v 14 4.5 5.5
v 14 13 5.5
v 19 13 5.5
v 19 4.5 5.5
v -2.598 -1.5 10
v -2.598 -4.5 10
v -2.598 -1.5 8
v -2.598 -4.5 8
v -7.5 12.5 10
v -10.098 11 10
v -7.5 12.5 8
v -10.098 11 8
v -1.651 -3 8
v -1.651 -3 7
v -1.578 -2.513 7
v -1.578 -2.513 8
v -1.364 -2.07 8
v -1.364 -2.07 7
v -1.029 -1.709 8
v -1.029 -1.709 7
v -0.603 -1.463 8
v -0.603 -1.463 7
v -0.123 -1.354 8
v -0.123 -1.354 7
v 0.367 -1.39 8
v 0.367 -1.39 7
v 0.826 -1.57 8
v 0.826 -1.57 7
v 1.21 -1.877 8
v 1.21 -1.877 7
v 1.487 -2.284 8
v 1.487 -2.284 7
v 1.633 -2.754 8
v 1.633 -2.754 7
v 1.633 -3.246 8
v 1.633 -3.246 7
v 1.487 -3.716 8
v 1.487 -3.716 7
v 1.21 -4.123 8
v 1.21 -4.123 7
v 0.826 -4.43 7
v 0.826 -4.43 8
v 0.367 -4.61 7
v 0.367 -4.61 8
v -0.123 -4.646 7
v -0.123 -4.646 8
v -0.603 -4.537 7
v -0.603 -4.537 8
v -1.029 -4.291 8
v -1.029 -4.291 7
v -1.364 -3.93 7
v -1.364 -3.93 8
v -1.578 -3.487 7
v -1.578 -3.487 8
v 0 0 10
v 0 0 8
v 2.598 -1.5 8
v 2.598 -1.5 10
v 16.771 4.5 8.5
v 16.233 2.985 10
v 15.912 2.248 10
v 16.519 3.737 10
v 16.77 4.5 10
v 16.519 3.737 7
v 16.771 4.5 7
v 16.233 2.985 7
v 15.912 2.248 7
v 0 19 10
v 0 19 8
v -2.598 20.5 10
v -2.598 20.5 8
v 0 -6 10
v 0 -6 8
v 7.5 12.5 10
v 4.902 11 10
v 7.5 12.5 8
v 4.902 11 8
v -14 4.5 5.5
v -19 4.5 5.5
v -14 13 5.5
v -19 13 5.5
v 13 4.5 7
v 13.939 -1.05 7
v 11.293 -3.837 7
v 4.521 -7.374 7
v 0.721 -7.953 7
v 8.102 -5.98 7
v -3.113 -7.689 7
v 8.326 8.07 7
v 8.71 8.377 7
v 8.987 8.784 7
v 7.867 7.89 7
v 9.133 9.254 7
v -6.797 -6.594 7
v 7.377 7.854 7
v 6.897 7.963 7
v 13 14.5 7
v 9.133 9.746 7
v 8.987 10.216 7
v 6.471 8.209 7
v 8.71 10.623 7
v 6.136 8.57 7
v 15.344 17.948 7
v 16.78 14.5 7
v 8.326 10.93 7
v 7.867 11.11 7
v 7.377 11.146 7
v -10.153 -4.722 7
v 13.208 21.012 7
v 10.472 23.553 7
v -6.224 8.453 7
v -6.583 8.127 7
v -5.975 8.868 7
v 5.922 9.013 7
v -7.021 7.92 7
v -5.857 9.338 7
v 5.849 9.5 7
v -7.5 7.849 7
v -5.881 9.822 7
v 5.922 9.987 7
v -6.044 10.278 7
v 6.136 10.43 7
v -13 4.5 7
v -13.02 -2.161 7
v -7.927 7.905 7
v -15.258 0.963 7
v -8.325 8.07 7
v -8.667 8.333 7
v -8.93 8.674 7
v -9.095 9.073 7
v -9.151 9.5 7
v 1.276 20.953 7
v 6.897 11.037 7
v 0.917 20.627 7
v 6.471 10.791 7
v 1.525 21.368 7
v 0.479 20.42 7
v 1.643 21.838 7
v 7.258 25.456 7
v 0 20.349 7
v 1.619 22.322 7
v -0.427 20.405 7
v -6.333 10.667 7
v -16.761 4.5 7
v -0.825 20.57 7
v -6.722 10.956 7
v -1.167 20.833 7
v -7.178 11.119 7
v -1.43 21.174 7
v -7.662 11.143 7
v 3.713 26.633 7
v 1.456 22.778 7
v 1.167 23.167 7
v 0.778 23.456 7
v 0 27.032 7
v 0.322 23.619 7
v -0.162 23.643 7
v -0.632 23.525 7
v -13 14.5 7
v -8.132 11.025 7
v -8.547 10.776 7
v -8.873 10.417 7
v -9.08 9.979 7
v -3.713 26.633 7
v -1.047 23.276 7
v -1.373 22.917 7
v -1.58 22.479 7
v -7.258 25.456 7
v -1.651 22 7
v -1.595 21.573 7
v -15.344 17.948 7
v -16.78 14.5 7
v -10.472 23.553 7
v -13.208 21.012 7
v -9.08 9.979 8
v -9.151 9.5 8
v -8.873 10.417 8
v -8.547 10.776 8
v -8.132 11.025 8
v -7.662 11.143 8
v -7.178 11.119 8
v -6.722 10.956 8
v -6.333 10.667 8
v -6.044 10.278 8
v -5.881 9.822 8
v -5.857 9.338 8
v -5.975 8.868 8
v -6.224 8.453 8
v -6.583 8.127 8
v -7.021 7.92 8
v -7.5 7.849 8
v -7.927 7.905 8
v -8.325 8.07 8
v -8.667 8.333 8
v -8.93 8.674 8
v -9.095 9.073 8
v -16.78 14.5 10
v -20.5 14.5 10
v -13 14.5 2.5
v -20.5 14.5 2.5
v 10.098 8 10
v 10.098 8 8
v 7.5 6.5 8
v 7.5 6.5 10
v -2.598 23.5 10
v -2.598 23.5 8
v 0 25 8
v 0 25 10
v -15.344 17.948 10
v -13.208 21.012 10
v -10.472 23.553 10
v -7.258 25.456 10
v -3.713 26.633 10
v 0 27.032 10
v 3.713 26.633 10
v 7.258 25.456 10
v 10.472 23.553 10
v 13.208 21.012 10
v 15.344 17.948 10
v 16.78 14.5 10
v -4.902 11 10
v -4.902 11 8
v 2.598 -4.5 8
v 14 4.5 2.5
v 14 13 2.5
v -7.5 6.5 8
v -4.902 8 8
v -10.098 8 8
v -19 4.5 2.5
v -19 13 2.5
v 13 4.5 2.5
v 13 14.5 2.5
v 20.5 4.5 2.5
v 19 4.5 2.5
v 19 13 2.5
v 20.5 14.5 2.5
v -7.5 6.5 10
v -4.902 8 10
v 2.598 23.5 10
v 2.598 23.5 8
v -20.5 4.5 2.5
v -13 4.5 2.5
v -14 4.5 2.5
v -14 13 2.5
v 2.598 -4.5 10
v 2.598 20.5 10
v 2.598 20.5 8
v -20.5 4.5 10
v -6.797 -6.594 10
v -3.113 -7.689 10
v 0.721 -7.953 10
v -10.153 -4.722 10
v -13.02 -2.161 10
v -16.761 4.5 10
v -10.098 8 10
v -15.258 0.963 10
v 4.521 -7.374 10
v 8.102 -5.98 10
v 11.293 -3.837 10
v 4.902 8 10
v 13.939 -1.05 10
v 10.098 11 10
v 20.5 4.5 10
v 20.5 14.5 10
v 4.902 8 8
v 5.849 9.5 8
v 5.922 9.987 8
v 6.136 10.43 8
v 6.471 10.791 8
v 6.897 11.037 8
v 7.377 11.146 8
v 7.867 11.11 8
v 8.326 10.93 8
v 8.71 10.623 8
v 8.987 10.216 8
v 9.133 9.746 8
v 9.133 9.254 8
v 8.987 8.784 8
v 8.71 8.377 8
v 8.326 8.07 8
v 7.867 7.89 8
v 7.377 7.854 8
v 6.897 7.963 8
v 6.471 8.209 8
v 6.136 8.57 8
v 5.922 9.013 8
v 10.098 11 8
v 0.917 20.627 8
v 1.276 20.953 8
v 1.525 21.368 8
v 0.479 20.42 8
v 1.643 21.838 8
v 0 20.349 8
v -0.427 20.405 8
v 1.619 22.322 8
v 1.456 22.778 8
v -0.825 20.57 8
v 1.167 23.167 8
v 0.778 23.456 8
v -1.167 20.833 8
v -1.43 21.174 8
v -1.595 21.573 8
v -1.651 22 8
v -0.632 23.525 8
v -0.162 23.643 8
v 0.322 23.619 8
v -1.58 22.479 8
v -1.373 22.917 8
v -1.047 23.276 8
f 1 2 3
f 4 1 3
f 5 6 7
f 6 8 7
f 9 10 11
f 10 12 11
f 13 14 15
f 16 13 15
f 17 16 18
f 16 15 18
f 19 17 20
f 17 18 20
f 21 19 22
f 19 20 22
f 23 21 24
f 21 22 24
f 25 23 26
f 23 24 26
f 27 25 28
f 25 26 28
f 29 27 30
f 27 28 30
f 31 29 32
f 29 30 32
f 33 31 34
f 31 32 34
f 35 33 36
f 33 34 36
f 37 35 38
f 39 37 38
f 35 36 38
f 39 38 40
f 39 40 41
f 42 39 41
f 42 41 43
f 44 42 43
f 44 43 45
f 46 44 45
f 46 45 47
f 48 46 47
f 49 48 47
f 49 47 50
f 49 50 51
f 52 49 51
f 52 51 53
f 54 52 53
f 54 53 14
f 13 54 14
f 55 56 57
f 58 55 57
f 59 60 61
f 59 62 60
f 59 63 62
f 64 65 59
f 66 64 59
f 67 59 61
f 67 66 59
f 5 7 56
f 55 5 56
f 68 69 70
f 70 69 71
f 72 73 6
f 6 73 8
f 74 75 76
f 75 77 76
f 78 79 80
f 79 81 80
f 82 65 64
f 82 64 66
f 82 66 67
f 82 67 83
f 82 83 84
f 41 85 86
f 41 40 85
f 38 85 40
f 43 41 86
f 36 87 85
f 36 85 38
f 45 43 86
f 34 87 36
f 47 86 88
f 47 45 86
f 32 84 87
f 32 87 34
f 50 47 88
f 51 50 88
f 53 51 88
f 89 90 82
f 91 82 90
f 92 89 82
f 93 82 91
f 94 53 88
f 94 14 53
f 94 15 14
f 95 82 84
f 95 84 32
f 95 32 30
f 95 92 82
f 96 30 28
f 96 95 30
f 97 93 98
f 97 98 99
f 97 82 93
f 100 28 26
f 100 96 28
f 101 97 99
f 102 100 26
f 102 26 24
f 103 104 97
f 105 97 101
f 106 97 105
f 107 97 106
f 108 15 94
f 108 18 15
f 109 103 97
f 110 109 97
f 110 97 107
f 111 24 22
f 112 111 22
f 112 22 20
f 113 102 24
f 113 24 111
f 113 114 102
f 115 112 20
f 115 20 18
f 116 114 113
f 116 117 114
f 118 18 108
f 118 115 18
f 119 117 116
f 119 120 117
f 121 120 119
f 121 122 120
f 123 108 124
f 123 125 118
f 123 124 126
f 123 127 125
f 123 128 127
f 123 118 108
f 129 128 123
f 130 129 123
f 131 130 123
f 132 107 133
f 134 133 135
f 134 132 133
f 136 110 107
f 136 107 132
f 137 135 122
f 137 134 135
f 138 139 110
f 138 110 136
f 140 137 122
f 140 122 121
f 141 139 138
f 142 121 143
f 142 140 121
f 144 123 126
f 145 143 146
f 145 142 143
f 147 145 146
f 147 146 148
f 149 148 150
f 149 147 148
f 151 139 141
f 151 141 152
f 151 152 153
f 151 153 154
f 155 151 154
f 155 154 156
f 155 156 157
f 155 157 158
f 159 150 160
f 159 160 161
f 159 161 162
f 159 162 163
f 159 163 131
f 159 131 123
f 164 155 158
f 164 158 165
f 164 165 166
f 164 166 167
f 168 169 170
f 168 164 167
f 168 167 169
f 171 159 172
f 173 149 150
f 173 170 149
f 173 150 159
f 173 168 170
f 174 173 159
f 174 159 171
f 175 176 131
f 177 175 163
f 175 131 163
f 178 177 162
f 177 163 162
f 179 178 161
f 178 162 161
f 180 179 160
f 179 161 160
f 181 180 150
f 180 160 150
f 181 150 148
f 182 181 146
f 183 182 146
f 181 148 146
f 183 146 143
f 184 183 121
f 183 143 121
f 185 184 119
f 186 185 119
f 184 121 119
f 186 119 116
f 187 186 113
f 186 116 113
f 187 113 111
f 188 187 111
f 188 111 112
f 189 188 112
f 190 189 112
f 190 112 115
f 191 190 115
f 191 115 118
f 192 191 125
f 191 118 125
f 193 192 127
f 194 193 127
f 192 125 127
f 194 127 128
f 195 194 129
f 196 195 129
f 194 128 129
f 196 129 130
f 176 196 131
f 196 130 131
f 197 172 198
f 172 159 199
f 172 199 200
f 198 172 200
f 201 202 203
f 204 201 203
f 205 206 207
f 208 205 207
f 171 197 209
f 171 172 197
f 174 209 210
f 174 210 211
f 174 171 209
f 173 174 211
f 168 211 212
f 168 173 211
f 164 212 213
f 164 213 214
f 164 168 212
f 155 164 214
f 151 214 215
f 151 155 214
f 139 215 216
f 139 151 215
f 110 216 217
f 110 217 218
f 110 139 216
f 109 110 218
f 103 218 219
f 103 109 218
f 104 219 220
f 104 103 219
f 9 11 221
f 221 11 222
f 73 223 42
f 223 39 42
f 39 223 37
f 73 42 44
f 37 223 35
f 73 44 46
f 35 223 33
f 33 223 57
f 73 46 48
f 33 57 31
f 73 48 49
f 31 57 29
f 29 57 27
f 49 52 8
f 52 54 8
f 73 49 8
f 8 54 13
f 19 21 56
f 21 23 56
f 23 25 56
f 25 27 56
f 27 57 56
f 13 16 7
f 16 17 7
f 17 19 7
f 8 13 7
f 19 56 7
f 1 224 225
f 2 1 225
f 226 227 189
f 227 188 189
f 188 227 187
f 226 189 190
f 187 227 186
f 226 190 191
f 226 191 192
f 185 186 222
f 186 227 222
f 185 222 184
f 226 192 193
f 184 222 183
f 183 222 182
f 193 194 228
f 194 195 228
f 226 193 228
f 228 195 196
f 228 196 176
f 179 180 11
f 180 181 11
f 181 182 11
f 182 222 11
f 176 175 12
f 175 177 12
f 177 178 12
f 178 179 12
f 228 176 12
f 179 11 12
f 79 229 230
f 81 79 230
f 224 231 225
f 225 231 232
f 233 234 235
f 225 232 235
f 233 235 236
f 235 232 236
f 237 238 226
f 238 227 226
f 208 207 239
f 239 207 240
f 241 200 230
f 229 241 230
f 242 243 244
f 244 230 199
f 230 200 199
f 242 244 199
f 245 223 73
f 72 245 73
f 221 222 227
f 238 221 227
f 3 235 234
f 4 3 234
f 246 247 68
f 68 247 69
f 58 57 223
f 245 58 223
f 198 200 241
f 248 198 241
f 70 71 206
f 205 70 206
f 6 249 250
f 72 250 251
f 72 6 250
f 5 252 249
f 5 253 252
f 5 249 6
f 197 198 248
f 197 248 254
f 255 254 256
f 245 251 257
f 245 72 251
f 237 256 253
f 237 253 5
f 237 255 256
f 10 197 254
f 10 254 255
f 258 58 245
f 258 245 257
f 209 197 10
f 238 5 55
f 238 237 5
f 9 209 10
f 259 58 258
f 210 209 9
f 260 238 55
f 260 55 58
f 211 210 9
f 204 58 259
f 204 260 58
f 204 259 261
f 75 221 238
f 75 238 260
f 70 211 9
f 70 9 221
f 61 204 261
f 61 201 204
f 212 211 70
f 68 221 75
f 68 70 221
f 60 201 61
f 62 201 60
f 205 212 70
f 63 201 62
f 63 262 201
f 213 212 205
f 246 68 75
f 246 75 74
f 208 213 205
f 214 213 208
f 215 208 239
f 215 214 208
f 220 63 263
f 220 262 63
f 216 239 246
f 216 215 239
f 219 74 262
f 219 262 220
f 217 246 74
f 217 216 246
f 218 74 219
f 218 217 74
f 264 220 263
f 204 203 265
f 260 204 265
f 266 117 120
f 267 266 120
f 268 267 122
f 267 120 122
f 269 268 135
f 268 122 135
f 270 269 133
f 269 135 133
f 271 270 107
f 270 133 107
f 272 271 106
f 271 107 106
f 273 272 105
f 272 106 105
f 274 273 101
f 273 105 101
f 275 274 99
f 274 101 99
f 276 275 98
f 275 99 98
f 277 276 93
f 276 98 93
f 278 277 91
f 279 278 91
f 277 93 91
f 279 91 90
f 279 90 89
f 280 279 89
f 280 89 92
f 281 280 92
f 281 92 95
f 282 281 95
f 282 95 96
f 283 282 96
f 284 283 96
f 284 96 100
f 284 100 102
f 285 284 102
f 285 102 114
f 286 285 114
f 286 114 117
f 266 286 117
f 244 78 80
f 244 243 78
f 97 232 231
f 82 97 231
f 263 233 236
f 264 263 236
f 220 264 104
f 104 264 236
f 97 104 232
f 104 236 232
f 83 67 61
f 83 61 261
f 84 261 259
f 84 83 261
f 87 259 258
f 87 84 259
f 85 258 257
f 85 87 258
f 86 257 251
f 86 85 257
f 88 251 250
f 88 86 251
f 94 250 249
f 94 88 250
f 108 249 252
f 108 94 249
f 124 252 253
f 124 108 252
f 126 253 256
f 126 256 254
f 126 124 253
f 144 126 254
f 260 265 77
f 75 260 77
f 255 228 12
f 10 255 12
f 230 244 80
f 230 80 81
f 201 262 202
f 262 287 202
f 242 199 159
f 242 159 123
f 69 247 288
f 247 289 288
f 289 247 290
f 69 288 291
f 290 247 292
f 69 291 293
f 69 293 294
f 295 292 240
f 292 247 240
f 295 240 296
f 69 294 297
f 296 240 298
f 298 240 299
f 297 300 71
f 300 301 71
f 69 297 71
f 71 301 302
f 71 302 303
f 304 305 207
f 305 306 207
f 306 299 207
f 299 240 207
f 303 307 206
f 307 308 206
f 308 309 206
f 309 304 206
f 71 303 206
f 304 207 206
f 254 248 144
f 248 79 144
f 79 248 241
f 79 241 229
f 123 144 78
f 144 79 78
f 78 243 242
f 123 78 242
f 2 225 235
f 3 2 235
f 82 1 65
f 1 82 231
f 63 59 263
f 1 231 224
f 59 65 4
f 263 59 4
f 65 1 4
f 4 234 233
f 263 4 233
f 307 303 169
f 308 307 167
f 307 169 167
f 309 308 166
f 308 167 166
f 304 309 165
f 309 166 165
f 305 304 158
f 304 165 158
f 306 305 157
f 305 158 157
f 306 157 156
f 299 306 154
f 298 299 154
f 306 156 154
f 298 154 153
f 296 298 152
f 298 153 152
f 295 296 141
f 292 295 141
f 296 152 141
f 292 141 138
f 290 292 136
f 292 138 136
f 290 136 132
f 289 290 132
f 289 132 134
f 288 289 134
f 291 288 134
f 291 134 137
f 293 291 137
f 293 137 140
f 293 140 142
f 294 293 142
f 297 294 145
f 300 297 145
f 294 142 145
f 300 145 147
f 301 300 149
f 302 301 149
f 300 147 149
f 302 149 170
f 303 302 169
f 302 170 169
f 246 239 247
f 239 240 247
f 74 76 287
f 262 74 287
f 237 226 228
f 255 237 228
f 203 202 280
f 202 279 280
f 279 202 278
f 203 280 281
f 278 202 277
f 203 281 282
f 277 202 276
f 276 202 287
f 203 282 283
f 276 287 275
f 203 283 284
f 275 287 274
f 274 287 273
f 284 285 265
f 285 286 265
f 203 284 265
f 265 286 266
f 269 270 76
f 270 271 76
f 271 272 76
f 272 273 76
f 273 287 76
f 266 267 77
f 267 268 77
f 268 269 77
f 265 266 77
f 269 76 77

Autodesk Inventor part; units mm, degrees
ref_plane "YZ Plane" through (0, 0, 0) normal (1, 0, 0) x (0, 1, 0)
ref_plane "XZ Plane" through (0, 0, 0) normal (0, 1, 0) x (-1, 0, 0)
ref_plane "XY Plane" through (0, 0, 0) normal (0, 0, 1) x (1, 0, 0)
sketch "Sketch1" plane through (0, 0, 0) normal (0, 0, 1) x (1, 0, 0)
  line L0 (0, 0) -> (4, 0)
  line L1 (4, 0) -> (4, 13)
  line L2 (4, 13) -> (0, 13)
  line L3 (0, 13) -> (0, 0)
  line L4 (4, 13) -> (-4, 13)
  line L5 (-4, 13) -> (-4, -8)
  line L6 (-4, -8) -> (4, -8)
  line L7 (4, -8) -> (4, 13)
  line L8 (-4, 13) -> (4, 13)
  line L9 (4, 13) -> (4, 21)
  line L10 (4, 21) -> (-4, 21)
  line L11 (-4, 21) -> (-4, 13)
  line L12 (4, 21) -> (7, 21)
  line L13 (7, 21) -> (7, 13)
  line L14 (7, 13) -> (4, 13)
  line L15 (4, 13) -> (4, 21)
  line L16 (7, 21) -> (11, 21)
  line L17 (11, 21) -> (11, 13)
  line L18 (11, 13) -> (7, 13)
  line L19 (7, 13) -> (7, 21)
  line L20 (11, 13) -> (4, 13)
  line L21 (4, 13) -> (4, -8)
  line L22 (4, -8) -> (11, -8)
  line L23 (4, -8) -> (11, -8)
  line L24 (11, -8) -> (11, 0)
  line L25 (11, 0) -> (4, 0)
  line L26 (4, 0) -> (4, -8)
  line L27 (11, -8) -> (14, -8)
  line L28 (14, -8) -> (14, 0)
  line L29 (14, 0) -> (11, 0)
  line L30 (11, 0) -> (11, -8)
  line L31 (14, -8) -> (19, -8)
  line L32 (19, -8) -> (19, 13)
  line L33 (19, 13) -> (14, 13)
  line L34 (14, 13) -> (14, -8)
  line L35 (14, 13) -> (22, 13)
  line L36 (14, 18) -> (14, 13)
  line L37 (19, 13) -> (14, 13)
  line L38 (14, 13) -> (14, 21)
  line L39 (14, 21) -> (19, 21)
  line L40 (19, 21) -> (19, 13)
  line L41 (19, -8) -> (-19, -8)
  line L42 (-19, -8) -> (-19, 0)
  line L43 (-19, 0) -> (19, 0)
  line L44 (19, 0) -> (19, -8)
  line L45 (-4, 0) -> (-7, 0)
  line L46 (-7, 0) -> (-7, -8)
  line L47 (-7, -8) -> (-4, -8)
  line L48 (-4, -8) -> (-4, 0)
  line L49 (-7, 0) -> (-11, 0)
  line L50 (-11, 0) -> (-11, -8)
  line L51 (-11, -8) -> (-7, -8)
  line L52 (-7, -8) -> (-7, 0)
  line L53 (-11, -8) -> (-14, -8)
  line L54 (-14, -8) -> (-14, 0)
  line L55 (-14, 0) -> (-11, 0)
  line L56 (-11, 0) -> (-11, -8)
  line L57 (7, 13) -> (11, 13)
  line L58 (11, 13) -> (11, 3)
  line L59 (11, 3) -> (7, 3)
  line L60 (7, 3) -> (7, 13)
  line L61 (-4, 13) -> (-7, 13)
  line L62 (-7, 13) -> (-7, 21)
  line L63 (-7, 21) -> (-4, 21)
  line L64 (-4, 21) -> (-4, 13)
  line L65 (-7, 21) -> (-11, 21)
  line L66 (-11, 21) -> (-11, 13)
  line L67 (-11, 13) -> (-7, 13)
  line L68 (-7, 13) -> (-7, 21)
  line L69 (-7, 13) -> (-11, 13)
  line L70 (-11, 13) -> (-11, 3)
  line L71 (-11, 3) -> (-7, 3)
  line L72 (-7, 3) -> (-7, 13)
  line L73 (-19, -8) -> (-14, -8)
  line L74 (-14, -8) -> (-14, 13)
  line L75 (-14, 13) -> (-19, 13)
  line L76 (-19, 13) -> (-19, -8)
  dimension "d0" = 4
  dimension "d1" = 13
  dimension "d2" = 8
  dimension "d3" = 21
  dimension "d4" = 8
  dimension "d5" = 8
  dimension "d6" = 3
  dimension "d7" = 8
  dimension "d8" = 4
  dimension "d9" = 8
  dimension "d10" = 3
  dimension "d11" = 8
  dimension "d12" = 5
  dimension "d13" = 21
  dimension "d16" = 5
  dimension "d17" = 8
  dimension "d18" = 38
  dimension "d19" = 8
  dimension "d20" = 3
  dimension "d21" = 8
  dimension "d22" = 4
  dimension "d23" = 8
  dimension "d24" = 3
  dimension "d25" = 8
  dimension "d26" = 10
  dimension "d27" = 3
  dimension "d28" = 8
  dimension "d29" = 4
  dimension "d30" = 8
  dimension "d31" = 4
  dimension "d32" = 10
  dimension "d33" = 5
  dimension "d34" = 21
extrude "Extrusion1" add sketch "Sketch1" along normal blind 2.5 contours L3 L2 L1 L0 | L43 L5 L4 L3 | L0 L7 L6 L5 L43 | L25 L24 L22 L7 | L4 L11 L10 L9 L2 | L5 L41 L46 L43 | L9 L12 L13 L14 | L29 L28 L27 L24 | L61 L62 L63 L11 | L46 L41 L50 L43 | L13 L16 L17 L18 | L18 L58 L59 L60 | L43 L32 L31 L28 | L34 L33 L32 L43 | L67 L66 L65 L62 | L72 L71 L70 L67 | L50 L41 L54 L43 | L54 L41 L42 L43 | L43 L76 L75 L74
sketch "Sketch2" plane through (0, 0, 2.5) normal (0, 0, 1) x (1, 0, 0)
  line L0 (-14, 13) -> (-19, 13) projected
  line L1 (-19, 13) -> (-14, 13)
  line L2 (-14, 13) -> (-14, 8)
  line L3 (-14, 8) -> (-19, 8)
  line L4 (-19, 8) -> (-19, 13)
  line L5 (14, 13) -> (19, 13)
  line L6 (19, 13) -> (19, 8)
  line L7 (19, 8) -> (14, 8)
  line L8 (14, 8) -> (14, 13)
  line L9 (-20.5, 6.5) -> (-12.5, 6.5)
  line L10 (-12.5, 6.5) -> (-12.5, 14.5)
  line L11 (-12.5, 14.5) -> (-20.5, 14.5)
  line L12 (-20.5, 14.5) -> (-20.5, 6.5)
  line L13 (12.5, 6.5) -> (20.5, 6.5)
  line L14 (20.5, 6.5) -> (20.5, 14.5)
  line L15 (20.5, 14.5) -> (12.5, 14.5)
  line L16 (12.5, 14.5) -> (12.5, 6.5)
  line L17 (-20.5, 14.5) -> (-19, 14.5)
  line L18 (-19, 14.5) -> (-19, 4.5)
  line L19 (-19, 4.5) -> (-20.5, 4.5)
  line L20 (-20.5, 4.5) -> (-20.5, 14.5)
  line L21 (-14, 0) -> (-14, 13) projected
  line L22 (-12.5, 14.5) -> (-14, 14.5)
  line L23 (-14, 14.5) -> (-14, 4.5)
  line L24 (-14, 4.5) -> (-12.5, 4.5)
  line L25 (-12.5, 4.5) -> (-12.5, 14.5)
  line L26 (-19, 14.5) -> (-14, 14.5)
  line L27 (-14, 14.5) -> (-14, 13)
  line L28 (-14, 13) -> (-19, 13)
  line L29 (-19, 13) -> (-19, 14.5)
  line L30 (12.5, 14.5) -> (20.5, 14.5)
  line L31 (20.5, 14.5) -> (20.5, 13)
  line L32 (20.5, 13) -> (12.5, 13)
  line L33 (12.5, 13) -> (12.5, 14.5)
  line L34 (14, 13) -> (14, 0) projected
  line L35 (12.5, 14.5) -> (14, 14.5)
  line L36 (14, 14.5) -> (14, 4.5)
  line L37 (14, 4.5) -> (12.5, 4.5)
  line L38 (12.5, 4.5) -> (12.5, 14.5)
  line L39 (19, -8) -> (19, 13) projected
  line L40 (20.5, 14.5) -> (19, 14.5)
  line L41 (19, 14.5) -> (19, 4.5)
  line L42 (19, 4.5) -> (20.5, 4.5)
  line L43 (20.5, 4.5) -> (20.5, 14.5)
  point P0 (0, 0)
  dimension "d37" = 5
  dimension "d38" = 5
  dimension "d39" = 5
  dimension "d40" = 5
  dimension "d41" = 1.5
  dimension "d42" = 1.5
  dimension "d43" = 1.5
  dimension "d44" = 10
  dimension "d45" = 10
  dimension "d46" = 10
extrude "Extrusion2" add sketch "Sketch2" along normal blind 3 contours L23 L11 L10 L9 L21 L2 | L0 L18 L11 L23 | L4 L18 L9 L12 L11 | L9 L25 L24 L21 | L18 L19 L20 L9 | L36 L15 L41 L5 | L8 L34 L13 L16 L32 | L32 L16 L15 L36 | L32 L14 L13 L39 L6 | L41 L15 L14 L32 | L34 L37 L38 L13 | L13 L43 L42 L39
sketch "Sketch4" plane through (0, 0, 5.5) normal (0, 0, 1) x (1, 0, 0)
  line L0 (-12.5, 14.5) -> (-20.5, 14.5) projected
  line L1 (-12.5, 4.5) -> (-12.5, 14.5) projected
  line L2 (-20.5, 14.5) -> (-12.5, 14.5)
  line L3 (-12.5, 14.5) -> (-12.5, 4.5)
  line L4 (-12.5, 4.5) -> (-20.5, 4.5)
  line L5 (-20.5, 4.5) -> (-20.5, 14.5)
  line L6 (12.5, 14.5) -> (12.5, 4.5) projected
  line L7 (20.5, 4.5) -> (20.5, 14.5) projected
  line L8 (12.5, 14.5) -> (20.5, 14.5)
  line L9 (20.5, 14.5) -> (20.5, 4.5)
  line L10 (20.5, 4.5) -> (12.5, 4.5)
  line L11 (12.5, 4.5) -> (12.5, 14.5)
  point P0 (0, 0)
extrude "Extrusion3" add sketch "Sketch4" along normal blind 1.5
sketch "Sketch5" plane through (0, 0, 7) normal (0, 0, 1) x (1, 0, 0)
  line L0 (-12.5, 14.5) -> (-20.5, 14.5) projected
  line L1 (20.5, 4.5) -> (20.5, 14.5) projected
  line L2 (-20.5, 14.5) -> (20.5, 14.5)
  line L3 (20.5, 14.5) -> (20.5, 4.5)
  line L4 (20.5, 4.5) -> (-20.5, 4.5)
  line L5 (-20.5, 4.5) -> (-20.5, 14.5)
  line L6 (-20.5, 14.5) -> (-20.5, 4.5) projected
  line L7 (-20.5, 9.5) -> (20.5, 9.5)
  line L8 (0, 9.5) -> (0, 14.5)
  circle A0 centre (0, 9.5) radius 17.5
  point P0 (0, 0)
extrude "Extrusion4" add sketch "Sketch5" along normal blind 1.5
sketch "Sketch6" plane through (0, 0, 8.5) normal (0, 0, 1) x (1, 0, 0)
  arc A0 (16.7705, 14.5) -> (-16.7705, 14.5) centre (0, 9.5) ccw projected
  circle A1 centre (0, 9.5) radius 17.5
  circle A2 centre (0, 9.5) radius 7.5
  circle A3 centre (0, 9.5) radius 12.5
  line L0 (12.5, 14.5) -> (12.5, 4.5) projected
  circle A4 centre (0, 9.5) radius 10
  circle A5 centre (0, -0.5) radius 1.651
  circle A6 centre (0, 2) radius 1.651
  circle A7 centre (7.5, 9.5) radius 1.651
  circle A8 centre (-7.5, 9.5) radius 1.651
  circle A9 centre (0, 17) radius 1.651
  circle A10 centre (0, 22) radius 1.651
  circle A11 centre (0, -3) radius 1.651
  point P0 (0, 0)
  dimension "d54" = 20
  dimension "d53" = 15
  dimension "d55" = 3.302
  dimension "d56" = 3.302
  dimension "d57" = 3.302
  dimension "d58" = 3.302
  dimension "d59" = 3.302
  dimension "d62" = 3.302
  dimension "d63" = 3.302
extrude "Extrusion5" cut sketch "Sketch6" against normal blind 2.5 contours A2 A7 | A2 A7 | A8 A2 | A2 A8 | A11 A5 | A5 A11 A3 | A3 A11 | A10 A3 | A3 A10
sketch "Sketch7" plane through (0, 0, 2.5) normal (0, 0, -1) x (-1, 0, 0)
  line L0 (-36.0395, -19.2499) -> (42.4279, -19.2499)
  line L1 (42.4279, -19.2499) -> (42.4279, 35.743)
  line L2 (42.4279, 35.743) -> (-36.0395, 35.743)
  line L3 (-36.0395, 35.743) -> (-36.0395, -19.2499)
  point P0 (0, 0)
extrude "Extrusion6" cut sketch "Sketch7" along normal blind 2.5
sketch "Sketch8" plane through (0, 0, 2.5) normal (0, 0, -1) x (-1, 0, 0)
  line L0 (-12.5, 14.5) -> (-12.5, 4.5) projected
  line L1 (-12.5, 14.5) -> (-13, 14.5)
  line L2 (-13, 14.5) -> (-13, 4.5)
  line L3 (-13, 4.5) -> (-12.5, 4.5)
  line L4 (-12.5, 4.5) -> (-12.5, 14.5)
  line L5 (12.5, 4.5) -> (12.5, 14.5) projected
  line L6 (12.5, 14.5) -> (13, 14.5)
  line L7 (13, 14.5) -> (13, 4.5)
  line L8 (13, 4.5) -> (12.5, 4.5)
  line L9 (12.5, 4.5) -> (12.5, 14.5)
  point P0 (0, 0)
  dimension "d66" = 0.5
  dimension "d67" = 10
  dimension "d68" = 0.5
  dimension "d69" = 10
extrude "Extrusion7" cut sketch "Sketch8" against normal blind 4.5
sketch "Sketch10" plane through (0, 0, 8.5) normal (0, 0, 1) x (1, 0, 0)
  circle A0 centre (0, 22) radius 1.651 projected
  circle A1 centre (0, 22) radius 1.651
  circle A2 centre (-7.5, 9.5) radius 1.651 projected
  circle A3 centre (-7.5, 9.5) radius 1.651
  circle A4 centre (0, -3) radius 1.651 projected
  circle A5 centre (0, -3) radius 1.651
  circle A6 centre (7.5, 9.5) radius 1.651 projected
  circle A7 centre (7.5, 9.5) radius 1.651
  line L0 (20.5, 14.5) -> (13, 14.5) projected
  line L1 (-13, 14.5) -> (-20.5, 14.5) projected
  arc A8 (16.75, 14.5) -> (-16.75, 14.5) centre (0, 9.5318) ccw
  line L2 (13, 4.5) -> (16.7705, 4.5) projected
  arc A9 (-16.731, 4.5) -> (16.7705, 4.5) centre (0.0198, 9.5951) ccw
  line L3 (-16.75, 14.5) -> (-20.5, 14.5)
  line L4 (-20.5, 4.5) -> (-19, 4.5) projected
  line L5 (-20.5, 14.5) -> (-20.5, 4.5)
  line L6 (-20.5, 4.5) -> (-16.731, 4.5)
  line L7 (16.7705, 4.5) -> (20.5, 4.5)
  line L8 (20.5, 4.5) -> (20.5, 14.5) projected
  line L9 (20.5, 4.5) -> (20.5, 14.5)
  line L10 (20.5, 14.5) -> (16.75, 14.5)
  point P0 (0, 0)
extrude "Extrusion8" add sketch "Sketch10" along normal blind 1.5
sketch "Sketch11" plane through (0, 0, 10) normal (0, 0, 1) x (1, 0, 0)
  circle A0 centre (-7.5, 9.5) radius 1.651 projected
  circle A1 centre (-7.5, 9.5) radius 3
  circle A2 centre (0, 22) radius 1.651 projected
  circle A3 centre (0, 22) radius 3
  circle A4 centre (7.5, 9.5) radius 1.651 projected
  circle A5 centre (7.5, 9.5) radius 3
  circle A6 centre (0, -3) radius 1.651 projected
  circle A7 centre (0, -3) radius 3
  line L0 (-7.5, 12.5) -> (-4.9019, 11)
  line L1 (-4.9019, 11) -> (-4.9019, 8)
  line L2 (-4.9019, 8) -> (-7.5, 6.5)
  line L3 (-7.5, 6.5) -> (-10.0981, 8)
  line L4 (-10.0981, 8) -> (-10.0981, 11)
  line L5 (-10.0981, 11) -> (-7.5, 12.5)
  line L6 (0, 25) -> (2.5981, 23.5)
  line L7 (2.5981, 23.5) -> (2.5981, 20.5)
  line L8 (2.5981, 20.5) -> (0, 19)
  line L9 (0, 19) -> (-2.5981, 20.5)
  line L10 (-2.5981, 20.5) -> (-2.5981, 23.5)
  line L11 (-2.5981, 23.5) -> (0, 25)
  line L12 (0, 0) -> (2.5981, -1.5)
  line L13 (2.5981, -1.5) -> (2.5981, -4.5)
  line L14 (2.5981, -4.5) -> (0, -6)
  line L15 (0, -6) -> (-2.5981, -4.5)
  line L16 (-2.5981, -4.5) -> (-2.5981, -1.5)
  line L17 (-2.5981, -1.5) -> (0, 0)
  line L18 (7.5, 12.5) -> (10.0981, 11)
  line L19 (10.0981, 11) -> (10.0981, 8)
  line L20 (10.0981, 8) -> (7.5, 6.5)
  line L21 (7.5, 6.5) -> (4.9019, 8)
  line L22 (4.9019, 8) -> (4.9019, 11)
  line L23 (4.9019, 11) -> (7.5, 12.5)
  dimension "d74" = 6
  dimension "d75" = 6
  dimension "d76" = 6
  dimension "d77" = 6
extrude "Extrusion9" cut sketch "Sketch11" along normal mid plane 100 contours L1 L2 L3 L4 L5 L0 | L7 L8 L9 L10 L11 L6 | L19 L20 L21 L22 L23 L18 | L13 L14 L15 L16 L17 L12
sketch "Sketch12" plane through (0, 0, 7) normal (0, 0, -1) x (-1, 0, 0)
  line L0 (0, 25) -> (2.5981, 23.5) projected
  line L1 (0, 25) -> (0, 19)
  line L2 (-7.5, 12.5) -> (-4.9019, 11) projected
  line L3 (0, 19) -> (-7.5, 12.5)
  line L4 (-7.5, 6.5) -> (-10.0981, 8) projected
  line L5 (-7.5, 12.5) -> (-7.5, 6.5)
  line L6 (-7.5, 6.5) -> (0, 0)
  line L7 (0, -6) -> (2.5981, -4.5) projected
  line L8 (0, 0) -> (0, -6)
  line L9 (7.5, 6.5) -> (10.0981, 8) projected
  line L10 (0, -6) -> (7.5, 6.5)
  line L11 (4.9019, 11) -> (7.5, 12.5) projected
  line L12 (7.5, 6.5) -> (7.5, 12.5)
  circle A0 centre (-7.5, 9.5) radius 1.651
  circle A1 centre (7.5, 9.5) radius 1.651
  circle A2 centre (0, -3) radius 1.651
  circle A3 centre (0, 22) radius 1.651
  line L13 (-3.75, 25.4224) -> (4.9019, 25.4224)
  line L14 (4.9019, 25.4224) -> (4.9019, 15.75)
  line L15 (4.9019, 15.75) -> (-3.75, 15.75)
  line L16 (-3.75, 15.75) -> (-3.75, 25.4224)
  line L17 (-12.2262, 13.506) -> (11.782, 13.506)
  line L18 (11.782, 13.506) -> (11.782, 3.9308)
  line L19 (11.782, 3.9308) -> (-12.2262, 3.9308)
  line L20 (-12.2262, 3.9308) -> (-12.2262, 13.506)
  line L21 (-4.9019, 1.9209) -> (4.9019, 1.9209)
  line L22 (4.9019, 1.9209) -> (4.9019, -6.5044)
  line L23 (4.9019, -6.5044) -> (-4.9019, -6.5044)
  line L24 (-4.9019, -6.5044) -> (-4.9019, 1.9209)
  dimension "d80" = 3.302
  dimension "d81" = 3.302
  dimension "d82" = 3.302
  dimension "d83" = 3.302
extrude "Extrusion10" add sketch "Sketch12" against normal blind 1 contours L16 L13 L14 L15 | L17 L18 L19 L6 L5 A0 L3 | L3 L5 A0 L6 L19 L20 L17 | L21 L10 A2 L8 L6 | L6 L8 A2 L10 L21 L22 L23 L24 | L10 L8 A2 picked at (0.1214, -5.0871)
sketch "Sketch13" plane through (0, 0, 10) normal (0, 0, 1) x (1, 0, 0)
  line L0 (-16.731, 4.5) -> (-16.7705, 4.5) projected
  line L1 (13, 4.5) -> (16.7705, 4.5) projected
  arc A0 (-16.731, 4.5) -> (16.7705, 4.5) centre (0.0198, 9.5951) ccw
  line L2 (16.75, 14.5) -> (16.7705, 14.5) projected
  line L3 (-16.75, 14.5) -> (-20.5, 14.5) projected
  arc A1 (16.75, 14.5) -> (-16.75, 14.5) centre (0, 9.5318) ccw
  line L4 (16.7705, 4.5) -> (26.5055, 4.5)
  line L5 (26.5055, 4.5) -> (1.8601, -34.0011)
  line L6 (1.8601, -34.0011) -> (-24.8012, -1.8101)
  line L7 (-24.8012, -1.8101) -> (-16.9164, 4.5)
  line L8 (-20.5, 4.5) -> (-16.731, 4.5) projected
  line L9 (-16.731, 4.5) -> (-16.9164, 4.5)
  line L10 (16.75, 14.5) -> (23.8627, 14.5)
  line L11 (23.8627, 14.5) -> (5.8015, 43.4279)
  line L12 (5.8015, 43.4279) -> (-36.4946, 28.9639)
  line L13 (-36.4946, 28.9639) -> (-20.5, 14.5)
  line L14 (-16.75, 14.5) -> (-20.5, 14.5)
  line L15 (-13, 14.5) -> (-16.7705, 14.5) projected
  point P0 (0, 0)
extrude "Extrusion11" cut sketch "Sketch13" along normal mid plane 100
sketch "Sketch14" plane through (0, 0, 7) normal (0, 0, -1) x (-1, 0, 0)
  arc A0 (16.75, 14.5) -> (-16.75, 14.5) centre (0, 9.5318) ccw projected
  circle A1 centre (0, 9.5318) radius 17.5
  circle A2 centre (0, 9.5318) radius 16.5
  point P0 (0, 0)
  dimension "d88" = 35
  dimension "d89" = 33
extrude "Extrusion12" add sketch "Sketch14" against normal blind 3
properties part number "loadCelMount"
